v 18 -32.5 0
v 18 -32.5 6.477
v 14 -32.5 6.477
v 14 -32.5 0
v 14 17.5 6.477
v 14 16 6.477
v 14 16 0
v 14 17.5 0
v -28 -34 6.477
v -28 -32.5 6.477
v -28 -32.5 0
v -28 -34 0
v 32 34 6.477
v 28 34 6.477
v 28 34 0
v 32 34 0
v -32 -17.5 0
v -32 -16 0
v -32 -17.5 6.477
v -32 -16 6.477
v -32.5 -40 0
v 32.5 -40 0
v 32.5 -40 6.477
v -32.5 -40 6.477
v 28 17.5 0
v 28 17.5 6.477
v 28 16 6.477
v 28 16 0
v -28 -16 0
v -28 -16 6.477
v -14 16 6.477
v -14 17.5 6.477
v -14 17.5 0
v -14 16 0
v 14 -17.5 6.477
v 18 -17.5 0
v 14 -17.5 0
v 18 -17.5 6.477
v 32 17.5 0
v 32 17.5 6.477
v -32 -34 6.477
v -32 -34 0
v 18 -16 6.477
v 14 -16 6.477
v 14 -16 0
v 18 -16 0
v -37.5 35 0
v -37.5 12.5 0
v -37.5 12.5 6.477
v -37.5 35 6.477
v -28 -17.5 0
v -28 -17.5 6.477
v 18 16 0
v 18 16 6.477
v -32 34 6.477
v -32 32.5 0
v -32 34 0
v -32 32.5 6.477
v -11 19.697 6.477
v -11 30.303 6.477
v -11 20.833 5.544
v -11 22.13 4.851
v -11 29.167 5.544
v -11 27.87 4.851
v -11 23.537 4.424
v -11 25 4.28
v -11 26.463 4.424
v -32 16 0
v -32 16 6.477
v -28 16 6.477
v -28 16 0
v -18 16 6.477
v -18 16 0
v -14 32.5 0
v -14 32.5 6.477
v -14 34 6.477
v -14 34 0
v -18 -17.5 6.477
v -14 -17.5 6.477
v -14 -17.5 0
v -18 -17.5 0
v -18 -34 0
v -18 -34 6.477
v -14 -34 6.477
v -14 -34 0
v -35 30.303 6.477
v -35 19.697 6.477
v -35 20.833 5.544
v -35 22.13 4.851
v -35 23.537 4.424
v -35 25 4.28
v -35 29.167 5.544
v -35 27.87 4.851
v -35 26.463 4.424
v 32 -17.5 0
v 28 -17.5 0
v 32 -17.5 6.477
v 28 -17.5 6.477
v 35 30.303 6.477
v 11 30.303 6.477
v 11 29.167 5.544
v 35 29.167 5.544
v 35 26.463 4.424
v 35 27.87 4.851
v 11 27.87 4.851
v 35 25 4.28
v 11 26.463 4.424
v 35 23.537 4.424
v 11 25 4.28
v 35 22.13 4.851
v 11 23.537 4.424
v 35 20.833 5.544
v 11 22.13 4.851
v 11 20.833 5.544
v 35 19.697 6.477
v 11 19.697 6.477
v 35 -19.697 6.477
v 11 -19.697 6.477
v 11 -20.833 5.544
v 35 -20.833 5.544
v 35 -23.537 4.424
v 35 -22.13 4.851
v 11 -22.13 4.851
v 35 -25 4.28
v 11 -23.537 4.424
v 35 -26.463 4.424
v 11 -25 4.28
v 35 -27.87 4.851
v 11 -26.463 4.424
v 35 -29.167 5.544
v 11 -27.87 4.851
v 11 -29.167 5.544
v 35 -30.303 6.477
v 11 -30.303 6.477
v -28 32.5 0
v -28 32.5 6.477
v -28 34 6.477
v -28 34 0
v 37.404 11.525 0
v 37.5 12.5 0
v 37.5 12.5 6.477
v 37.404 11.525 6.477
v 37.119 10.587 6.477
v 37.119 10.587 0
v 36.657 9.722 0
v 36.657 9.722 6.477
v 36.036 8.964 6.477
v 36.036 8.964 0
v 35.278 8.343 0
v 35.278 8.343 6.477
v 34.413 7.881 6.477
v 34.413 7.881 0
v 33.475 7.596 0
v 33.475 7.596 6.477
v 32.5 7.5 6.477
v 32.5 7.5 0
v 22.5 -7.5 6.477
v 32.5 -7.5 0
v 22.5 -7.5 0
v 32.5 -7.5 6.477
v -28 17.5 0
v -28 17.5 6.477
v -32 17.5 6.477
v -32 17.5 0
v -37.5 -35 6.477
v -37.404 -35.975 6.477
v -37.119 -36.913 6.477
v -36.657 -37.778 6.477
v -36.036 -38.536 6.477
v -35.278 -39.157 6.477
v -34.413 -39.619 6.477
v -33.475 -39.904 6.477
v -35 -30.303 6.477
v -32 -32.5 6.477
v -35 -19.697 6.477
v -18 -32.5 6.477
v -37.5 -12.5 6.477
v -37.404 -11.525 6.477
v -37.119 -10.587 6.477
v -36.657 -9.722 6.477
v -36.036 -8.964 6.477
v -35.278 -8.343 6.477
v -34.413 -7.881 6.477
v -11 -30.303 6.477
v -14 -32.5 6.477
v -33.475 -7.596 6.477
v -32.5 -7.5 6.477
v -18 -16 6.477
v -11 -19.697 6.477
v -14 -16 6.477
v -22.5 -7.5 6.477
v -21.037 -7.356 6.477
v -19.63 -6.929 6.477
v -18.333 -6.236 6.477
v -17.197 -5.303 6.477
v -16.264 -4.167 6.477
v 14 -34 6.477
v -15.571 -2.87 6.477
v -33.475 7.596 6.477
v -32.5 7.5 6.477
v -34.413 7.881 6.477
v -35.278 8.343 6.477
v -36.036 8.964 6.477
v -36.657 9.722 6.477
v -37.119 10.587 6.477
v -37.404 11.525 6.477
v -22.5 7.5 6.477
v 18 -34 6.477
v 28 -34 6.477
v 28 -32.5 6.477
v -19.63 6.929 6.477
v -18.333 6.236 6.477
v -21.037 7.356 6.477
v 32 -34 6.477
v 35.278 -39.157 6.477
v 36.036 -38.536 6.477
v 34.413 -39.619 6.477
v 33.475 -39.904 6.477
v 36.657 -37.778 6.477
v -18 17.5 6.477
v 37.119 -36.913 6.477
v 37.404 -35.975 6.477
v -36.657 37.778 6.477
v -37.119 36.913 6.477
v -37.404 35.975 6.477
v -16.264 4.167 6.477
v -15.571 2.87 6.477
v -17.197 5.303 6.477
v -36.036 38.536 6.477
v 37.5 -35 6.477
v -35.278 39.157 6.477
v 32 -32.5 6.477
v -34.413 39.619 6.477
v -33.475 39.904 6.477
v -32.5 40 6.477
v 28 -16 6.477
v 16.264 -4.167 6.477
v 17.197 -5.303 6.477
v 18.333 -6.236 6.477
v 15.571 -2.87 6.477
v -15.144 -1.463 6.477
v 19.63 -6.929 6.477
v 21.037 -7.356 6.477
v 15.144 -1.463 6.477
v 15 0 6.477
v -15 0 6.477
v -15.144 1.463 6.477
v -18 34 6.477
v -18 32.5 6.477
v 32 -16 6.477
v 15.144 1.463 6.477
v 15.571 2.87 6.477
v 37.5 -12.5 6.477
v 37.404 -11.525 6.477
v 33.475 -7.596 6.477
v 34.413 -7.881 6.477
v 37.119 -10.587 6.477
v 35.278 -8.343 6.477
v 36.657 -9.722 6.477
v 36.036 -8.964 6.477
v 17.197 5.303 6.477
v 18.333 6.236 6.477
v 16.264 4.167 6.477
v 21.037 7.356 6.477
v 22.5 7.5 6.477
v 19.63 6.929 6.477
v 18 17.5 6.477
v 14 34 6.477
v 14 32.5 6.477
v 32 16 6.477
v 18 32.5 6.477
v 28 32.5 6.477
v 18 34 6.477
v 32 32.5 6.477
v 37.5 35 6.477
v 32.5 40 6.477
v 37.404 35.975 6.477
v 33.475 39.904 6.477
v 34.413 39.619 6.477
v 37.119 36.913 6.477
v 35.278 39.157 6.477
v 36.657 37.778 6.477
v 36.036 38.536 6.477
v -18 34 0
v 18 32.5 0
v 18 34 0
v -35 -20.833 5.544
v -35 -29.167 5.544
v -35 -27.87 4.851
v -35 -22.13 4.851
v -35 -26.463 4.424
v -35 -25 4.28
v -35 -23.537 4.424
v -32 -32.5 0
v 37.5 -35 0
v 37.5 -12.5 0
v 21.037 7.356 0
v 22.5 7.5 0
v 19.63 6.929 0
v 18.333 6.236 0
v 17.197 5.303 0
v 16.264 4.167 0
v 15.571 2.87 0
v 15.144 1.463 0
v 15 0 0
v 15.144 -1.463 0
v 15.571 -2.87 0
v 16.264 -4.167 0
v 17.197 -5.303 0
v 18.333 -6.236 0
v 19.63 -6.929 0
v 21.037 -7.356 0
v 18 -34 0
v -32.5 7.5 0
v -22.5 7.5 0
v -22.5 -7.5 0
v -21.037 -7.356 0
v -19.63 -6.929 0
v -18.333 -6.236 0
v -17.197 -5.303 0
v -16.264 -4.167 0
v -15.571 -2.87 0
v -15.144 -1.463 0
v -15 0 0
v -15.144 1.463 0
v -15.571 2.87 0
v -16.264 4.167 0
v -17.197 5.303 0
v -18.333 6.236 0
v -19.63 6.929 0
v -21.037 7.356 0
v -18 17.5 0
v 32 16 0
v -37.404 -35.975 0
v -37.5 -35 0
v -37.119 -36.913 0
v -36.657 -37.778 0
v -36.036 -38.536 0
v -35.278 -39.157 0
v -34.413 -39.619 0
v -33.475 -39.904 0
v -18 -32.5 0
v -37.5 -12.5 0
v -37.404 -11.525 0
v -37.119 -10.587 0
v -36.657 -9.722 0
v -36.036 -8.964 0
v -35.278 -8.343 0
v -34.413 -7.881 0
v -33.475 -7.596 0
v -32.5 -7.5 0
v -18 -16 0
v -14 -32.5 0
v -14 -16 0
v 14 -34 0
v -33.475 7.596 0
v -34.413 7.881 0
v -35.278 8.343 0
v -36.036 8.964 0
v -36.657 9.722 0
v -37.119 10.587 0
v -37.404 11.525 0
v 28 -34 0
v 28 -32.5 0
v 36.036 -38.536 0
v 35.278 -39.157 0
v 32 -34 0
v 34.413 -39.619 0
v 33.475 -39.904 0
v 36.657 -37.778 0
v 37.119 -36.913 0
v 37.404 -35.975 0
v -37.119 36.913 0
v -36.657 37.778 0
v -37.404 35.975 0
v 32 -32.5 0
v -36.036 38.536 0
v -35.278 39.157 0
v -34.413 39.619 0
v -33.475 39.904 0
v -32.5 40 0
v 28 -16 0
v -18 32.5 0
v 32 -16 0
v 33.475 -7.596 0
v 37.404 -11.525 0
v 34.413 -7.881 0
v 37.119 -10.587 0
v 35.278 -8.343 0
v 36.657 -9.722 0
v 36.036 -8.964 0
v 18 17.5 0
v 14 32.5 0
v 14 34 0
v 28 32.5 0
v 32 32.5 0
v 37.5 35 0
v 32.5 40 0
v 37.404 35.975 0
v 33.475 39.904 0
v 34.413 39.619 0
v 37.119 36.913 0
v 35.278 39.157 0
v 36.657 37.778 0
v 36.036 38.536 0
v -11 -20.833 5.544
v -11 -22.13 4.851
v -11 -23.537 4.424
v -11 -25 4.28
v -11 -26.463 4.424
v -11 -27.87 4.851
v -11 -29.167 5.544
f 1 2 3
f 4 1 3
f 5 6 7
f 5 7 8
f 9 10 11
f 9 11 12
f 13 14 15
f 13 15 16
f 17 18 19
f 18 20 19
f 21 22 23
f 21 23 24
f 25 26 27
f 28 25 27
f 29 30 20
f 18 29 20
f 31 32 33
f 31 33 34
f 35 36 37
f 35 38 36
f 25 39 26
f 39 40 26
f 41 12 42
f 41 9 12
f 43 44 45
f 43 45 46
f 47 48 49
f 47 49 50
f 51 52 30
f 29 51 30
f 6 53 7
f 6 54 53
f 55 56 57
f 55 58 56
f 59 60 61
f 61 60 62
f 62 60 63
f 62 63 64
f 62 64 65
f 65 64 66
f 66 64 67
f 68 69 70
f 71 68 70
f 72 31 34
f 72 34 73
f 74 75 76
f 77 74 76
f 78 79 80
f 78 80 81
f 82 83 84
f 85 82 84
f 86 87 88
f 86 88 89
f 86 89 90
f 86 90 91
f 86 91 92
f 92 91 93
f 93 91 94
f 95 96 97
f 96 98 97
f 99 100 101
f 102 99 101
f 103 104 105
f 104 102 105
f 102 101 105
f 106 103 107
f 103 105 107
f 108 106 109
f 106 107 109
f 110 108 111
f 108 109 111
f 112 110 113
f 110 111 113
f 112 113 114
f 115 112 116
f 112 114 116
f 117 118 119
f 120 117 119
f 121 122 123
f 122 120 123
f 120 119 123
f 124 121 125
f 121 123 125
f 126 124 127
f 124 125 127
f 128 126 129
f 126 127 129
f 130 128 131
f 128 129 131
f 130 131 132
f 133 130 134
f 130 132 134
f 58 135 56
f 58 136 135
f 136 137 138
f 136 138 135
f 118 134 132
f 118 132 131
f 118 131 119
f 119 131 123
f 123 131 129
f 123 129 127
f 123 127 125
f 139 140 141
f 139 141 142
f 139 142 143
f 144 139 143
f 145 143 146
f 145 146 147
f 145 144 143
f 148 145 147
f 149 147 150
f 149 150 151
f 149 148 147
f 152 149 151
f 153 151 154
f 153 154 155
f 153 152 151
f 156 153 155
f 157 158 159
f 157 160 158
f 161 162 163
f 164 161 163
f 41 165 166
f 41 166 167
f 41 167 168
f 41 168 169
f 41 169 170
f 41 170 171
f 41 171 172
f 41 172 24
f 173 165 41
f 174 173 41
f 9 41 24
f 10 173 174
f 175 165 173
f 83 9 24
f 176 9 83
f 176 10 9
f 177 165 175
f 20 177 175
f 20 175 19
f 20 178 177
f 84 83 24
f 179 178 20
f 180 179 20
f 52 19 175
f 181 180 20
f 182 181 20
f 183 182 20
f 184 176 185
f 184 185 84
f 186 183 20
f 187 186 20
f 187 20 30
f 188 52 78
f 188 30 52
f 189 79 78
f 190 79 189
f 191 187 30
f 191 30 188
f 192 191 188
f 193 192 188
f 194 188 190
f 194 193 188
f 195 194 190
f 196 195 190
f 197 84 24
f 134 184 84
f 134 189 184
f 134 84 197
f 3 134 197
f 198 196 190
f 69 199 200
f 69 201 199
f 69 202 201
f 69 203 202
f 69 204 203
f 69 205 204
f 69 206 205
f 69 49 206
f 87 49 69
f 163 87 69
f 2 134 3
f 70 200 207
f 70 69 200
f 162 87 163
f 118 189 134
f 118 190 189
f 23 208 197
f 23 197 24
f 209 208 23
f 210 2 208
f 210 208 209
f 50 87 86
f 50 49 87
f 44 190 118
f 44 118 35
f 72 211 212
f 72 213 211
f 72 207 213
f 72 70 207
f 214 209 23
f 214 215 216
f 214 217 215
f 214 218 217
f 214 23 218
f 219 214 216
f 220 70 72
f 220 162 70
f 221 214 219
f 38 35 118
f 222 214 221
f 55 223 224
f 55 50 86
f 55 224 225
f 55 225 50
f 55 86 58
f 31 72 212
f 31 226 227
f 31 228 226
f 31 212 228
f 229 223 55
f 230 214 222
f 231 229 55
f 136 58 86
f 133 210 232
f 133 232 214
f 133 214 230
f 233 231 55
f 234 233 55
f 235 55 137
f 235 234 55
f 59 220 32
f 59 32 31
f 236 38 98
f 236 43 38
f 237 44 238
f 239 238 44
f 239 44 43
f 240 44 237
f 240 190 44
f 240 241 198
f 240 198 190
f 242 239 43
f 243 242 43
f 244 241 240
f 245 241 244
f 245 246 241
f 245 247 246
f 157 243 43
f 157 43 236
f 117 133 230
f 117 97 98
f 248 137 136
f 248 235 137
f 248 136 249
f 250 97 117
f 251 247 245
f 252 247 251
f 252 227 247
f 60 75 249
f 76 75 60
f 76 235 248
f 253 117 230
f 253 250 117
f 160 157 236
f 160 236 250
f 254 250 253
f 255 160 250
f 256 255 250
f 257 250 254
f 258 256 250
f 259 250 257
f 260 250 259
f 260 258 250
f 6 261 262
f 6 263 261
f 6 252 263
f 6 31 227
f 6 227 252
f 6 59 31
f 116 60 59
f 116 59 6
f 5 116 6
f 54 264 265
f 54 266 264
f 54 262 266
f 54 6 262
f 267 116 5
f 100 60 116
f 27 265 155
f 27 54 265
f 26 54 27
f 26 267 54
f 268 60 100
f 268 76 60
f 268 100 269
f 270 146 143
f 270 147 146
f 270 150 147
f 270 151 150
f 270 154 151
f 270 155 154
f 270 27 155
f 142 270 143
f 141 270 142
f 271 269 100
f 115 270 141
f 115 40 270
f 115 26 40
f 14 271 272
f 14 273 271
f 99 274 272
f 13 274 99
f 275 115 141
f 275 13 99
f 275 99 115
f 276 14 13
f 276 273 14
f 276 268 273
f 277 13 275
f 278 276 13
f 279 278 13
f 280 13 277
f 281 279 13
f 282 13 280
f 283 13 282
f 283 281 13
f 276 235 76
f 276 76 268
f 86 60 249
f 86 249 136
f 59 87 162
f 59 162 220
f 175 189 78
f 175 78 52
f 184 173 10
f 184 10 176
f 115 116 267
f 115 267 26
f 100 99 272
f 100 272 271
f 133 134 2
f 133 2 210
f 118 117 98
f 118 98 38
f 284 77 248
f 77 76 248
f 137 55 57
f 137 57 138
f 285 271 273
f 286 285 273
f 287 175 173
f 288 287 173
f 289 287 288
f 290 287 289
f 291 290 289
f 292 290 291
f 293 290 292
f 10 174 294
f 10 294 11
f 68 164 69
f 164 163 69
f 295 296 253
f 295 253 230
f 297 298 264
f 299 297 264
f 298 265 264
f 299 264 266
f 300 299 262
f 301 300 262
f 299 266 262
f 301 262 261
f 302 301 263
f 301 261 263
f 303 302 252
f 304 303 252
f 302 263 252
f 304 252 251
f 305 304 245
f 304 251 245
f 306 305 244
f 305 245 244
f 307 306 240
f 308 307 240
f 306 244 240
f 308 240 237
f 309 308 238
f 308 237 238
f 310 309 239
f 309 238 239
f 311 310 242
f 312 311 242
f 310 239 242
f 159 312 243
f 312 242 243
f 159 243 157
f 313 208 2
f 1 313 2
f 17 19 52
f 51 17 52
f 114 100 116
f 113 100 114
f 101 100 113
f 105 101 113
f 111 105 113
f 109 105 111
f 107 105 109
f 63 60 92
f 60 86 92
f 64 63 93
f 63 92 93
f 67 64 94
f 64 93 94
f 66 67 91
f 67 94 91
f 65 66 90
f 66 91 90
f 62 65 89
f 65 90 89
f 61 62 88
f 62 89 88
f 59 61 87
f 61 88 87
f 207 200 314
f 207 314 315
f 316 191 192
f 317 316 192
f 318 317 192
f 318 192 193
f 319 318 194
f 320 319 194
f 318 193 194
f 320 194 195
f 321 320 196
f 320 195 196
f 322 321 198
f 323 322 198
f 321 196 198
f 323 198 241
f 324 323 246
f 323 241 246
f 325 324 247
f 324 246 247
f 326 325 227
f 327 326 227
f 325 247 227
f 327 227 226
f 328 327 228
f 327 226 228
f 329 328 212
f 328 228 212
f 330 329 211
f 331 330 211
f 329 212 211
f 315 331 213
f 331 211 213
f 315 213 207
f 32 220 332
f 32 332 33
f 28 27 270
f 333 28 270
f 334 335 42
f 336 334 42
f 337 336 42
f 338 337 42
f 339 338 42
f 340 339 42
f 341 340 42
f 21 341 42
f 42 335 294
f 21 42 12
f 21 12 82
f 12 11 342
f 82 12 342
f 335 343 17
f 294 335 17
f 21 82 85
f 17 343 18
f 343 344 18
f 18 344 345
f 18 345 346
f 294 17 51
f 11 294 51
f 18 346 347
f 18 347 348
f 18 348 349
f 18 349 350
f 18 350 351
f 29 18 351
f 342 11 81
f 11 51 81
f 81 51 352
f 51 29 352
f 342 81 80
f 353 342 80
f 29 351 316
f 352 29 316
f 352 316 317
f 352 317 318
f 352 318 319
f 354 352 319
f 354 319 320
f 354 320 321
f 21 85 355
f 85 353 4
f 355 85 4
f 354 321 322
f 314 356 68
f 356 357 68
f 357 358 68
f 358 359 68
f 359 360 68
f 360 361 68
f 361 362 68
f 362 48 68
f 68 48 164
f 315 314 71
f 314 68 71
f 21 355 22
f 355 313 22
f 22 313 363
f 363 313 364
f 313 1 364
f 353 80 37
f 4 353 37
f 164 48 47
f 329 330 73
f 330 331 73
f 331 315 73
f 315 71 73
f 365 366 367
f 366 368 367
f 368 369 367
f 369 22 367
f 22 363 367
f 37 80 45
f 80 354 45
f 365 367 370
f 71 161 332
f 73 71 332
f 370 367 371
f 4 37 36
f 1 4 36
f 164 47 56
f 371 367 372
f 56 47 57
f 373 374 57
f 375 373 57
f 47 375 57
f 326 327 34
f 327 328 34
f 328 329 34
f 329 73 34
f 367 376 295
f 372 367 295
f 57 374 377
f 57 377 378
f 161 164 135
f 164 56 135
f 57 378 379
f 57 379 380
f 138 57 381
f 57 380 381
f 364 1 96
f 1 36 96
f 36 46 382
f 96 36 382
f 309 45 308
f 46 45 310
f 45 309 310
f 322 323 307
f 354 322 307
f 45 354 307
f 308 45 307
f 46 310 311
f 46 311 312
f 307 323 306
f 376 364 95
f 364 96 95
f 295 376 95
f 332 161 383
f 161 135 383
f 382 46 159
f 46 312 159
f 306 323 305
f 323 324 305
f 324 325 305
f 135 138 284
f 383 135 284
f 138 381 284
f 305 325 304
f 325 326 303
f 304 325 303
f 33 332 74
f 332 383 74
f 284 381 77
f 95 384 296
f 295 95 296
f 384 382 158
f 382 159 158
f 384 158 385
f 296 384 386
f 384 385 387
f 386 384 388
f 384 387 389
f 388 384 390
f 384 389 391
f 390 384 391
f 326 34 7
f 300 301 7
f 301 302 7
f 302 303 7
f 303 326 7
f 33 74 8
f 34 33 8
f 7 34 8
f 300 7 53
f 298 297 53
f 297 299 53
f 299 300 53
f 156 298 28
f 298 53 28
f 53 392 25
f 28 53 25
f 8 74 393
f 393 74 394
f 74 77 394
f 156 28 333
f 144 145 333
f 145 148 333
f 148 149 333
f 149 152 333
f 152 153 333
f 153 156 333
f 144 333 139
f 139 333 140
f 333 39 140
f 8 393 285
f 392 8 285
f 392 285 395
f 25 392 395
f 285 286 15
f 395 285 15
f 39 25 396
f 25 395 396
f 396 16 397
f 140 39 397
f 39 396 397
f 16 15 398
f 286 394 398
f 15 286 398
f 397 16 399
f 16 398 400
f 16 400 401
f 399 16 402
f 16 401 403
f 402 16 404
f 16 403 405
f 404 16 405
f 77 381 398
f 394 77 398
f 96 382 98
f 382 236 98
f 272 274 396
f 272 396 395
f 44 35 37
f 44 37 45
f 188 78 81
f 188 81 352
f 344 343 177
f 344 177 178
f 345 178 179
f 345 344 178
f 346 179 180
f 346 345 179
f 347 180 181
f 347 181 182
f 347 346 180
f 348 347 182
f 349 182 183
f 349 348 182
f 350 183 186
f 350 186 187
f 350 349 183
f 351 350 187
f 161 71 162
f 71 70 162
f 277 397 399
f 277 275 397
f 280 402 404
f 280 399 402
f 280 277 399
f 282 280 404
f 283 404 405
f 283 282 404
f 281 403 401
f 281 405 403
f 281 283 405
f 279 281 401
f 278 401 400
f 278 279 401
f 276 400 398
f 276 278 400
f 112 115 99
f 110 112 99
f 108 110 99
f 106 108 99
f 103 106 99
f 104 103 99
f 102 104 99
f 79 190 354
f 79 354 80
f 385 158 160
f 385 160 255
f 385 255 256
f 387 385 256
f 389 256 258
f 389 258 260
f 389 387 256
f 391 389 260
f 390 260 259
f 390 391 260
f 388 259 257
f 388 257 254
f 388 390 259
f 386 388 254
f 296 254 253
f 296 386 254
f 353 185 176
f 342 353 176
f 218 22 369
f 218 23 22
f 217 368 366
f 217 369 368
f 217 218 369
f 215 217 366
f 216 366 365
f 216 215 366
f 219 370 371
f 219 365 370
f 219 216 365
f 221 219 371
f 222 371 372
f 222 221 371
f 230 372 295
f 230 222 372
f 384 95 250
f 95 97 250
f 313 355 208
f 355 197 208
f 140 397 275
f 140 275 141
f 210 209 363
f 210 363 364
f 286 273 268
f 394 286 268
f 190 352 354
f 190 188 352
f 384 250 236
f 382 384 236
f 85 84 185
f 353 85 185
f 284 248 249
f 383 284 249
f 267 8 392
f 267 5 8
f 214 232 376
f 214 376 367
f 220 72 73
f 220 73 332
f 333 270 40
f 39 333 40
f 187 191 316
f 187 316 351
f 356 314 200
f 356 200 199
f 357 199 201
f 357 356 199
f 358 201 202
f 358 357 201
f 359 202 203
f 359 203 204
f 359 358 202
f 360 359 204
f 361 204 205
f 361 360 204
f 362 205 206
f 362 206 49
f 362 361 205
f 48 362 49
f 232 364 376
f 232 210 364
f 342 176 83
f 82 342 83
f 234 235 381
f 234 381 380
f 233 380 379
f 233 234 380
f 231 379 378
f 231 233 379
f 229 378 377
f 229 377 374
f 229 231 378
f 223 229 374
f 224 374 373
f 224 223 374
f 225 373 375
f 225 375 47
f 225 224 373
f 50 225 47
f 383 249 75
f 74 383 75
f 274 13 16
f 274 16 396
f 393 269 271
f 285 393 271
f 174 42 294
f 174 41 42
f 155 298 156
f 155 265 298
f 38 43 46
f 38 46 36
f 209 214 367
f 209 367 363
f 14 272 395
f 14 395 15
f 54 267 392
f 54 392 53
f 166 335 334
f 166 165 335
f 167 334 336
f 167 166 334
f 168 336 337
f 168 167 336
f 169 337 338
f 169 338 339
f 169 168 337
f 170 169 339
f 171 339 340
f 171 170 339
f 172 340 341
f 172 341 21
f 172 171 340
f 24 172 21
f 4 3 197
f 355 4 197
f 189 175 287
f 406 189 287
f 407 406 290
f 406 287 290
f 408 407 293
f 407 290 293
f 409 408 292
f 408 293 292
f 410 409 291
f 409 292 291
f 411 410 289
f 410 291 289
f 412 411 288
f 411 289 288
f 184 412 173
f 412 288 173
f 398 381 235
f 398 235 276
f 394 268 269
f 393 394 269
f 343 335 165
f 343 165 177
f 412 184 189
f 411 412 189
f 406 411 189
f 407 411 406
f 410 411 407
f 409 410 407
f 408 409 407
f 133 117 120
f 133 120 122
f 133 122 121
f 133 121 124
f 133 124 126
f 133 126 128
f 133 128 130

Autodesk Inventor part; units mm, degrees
ref_plane "YZ Plane" through (0, 0, 0) normal (1, 0, 0) x (0, 1, 0)
ref_plane "XZ Plane" through (0, 0, 0) normal (0, 1, 0) x (-1, 0, 0)
ref_plane "XY Plane" through (0, 0, 0) normal (0, 0, 1) x (1, 0, 0)
sketch "Sketch1" plane through (0, 0, 0) normal (0, 0, 1) x (1, 0, 0)
  line L0 (-37.5, 40) -> (37.5, 40)
  line L1 (37.5, 40) -> (37.5, -40)
  line L2 (37.5, -40) -> (-37.5, -40)
  line L3 (-37.5, -40) -> (-37.5, 40)
  point P0 (0, 0)
  point P1 (37.5, 0)
  point P2 (0, 40)
  dimension "d0" = 75
  dimension "d2" = 80
extrude "Extrusion1" add sketch "Sketch1" along normal blind 6.477
sketch "Sketch2" plane through (0, 0, 6.477) normal (0, 0, 1) x (1, 0, 0)
  line L0 (-37.5, 40) -> (-37.5, -40) projected
  line L1 (-11, 19.6967) -> (11, 19.6967) construction
  line L2 (11, 19.6967) -> (11, -19.6967) construction
  line L3 (11, -19.6967) -> (-11, -19.6967) construction
  line L4 (-11, -19.6967) -> (-11, 19.6967) construction
  line L5 (-11, 19.6967) -> (-35, 19.6967)
  line L6 (-35, 19.6967) -> (-35, 30.3033)
  line L7 (-35, 30.3033) -> (-11, 30.3033)
  line L8 (-11, 30.3033) -> (-11, 19.6967)
  line L9 (11, 19.6967) -> (35, 19.6967)
  line L10 (35, 19.6967) -> (35, 30.3033)
  line L11 (35, 30.3033) -> (11, 30.3033)
  line L12 (11, 30.3033) -> (11, 19.6967)
  line L13 (-11, -19.6967) -> (-35, -19.6967)
  line L14 (-35, -19.6967) -> (-35, -30.3033)
  line L15 (-35, -30.3033) -> (-11, -30.3033)
  line L16 (-11, -30.3033) -> (-11, -19.6967)
  line L17 (11, -19.6967) -> (35, -19.6967)
  line L18 (35, -19.6967) -> (35, -30.3033)
  line L19 (35, -30.3033) -> (11, -30.3033)
  line L20 (11, -30.3033) -> (11, -19.6967)
  circle A0 centre (-11, 25) radius 7.5 construction
  line L21 (-11, 25) -> (-5.6967, 19.6967) construction
  point P0 (0, 0)
  point P1 (-11, 0)
  point P2 (0, 19.6967)
  dimension "d11" = 15
  dimension "d5" = 50
  dimension "d7" = 24
  dimension "d9" = 2.5
  dimension "d10" = 45
extrude "Extrusion2" cut sketch "Sketch2" against normal through all
sketch "Sketch3" plane through (-35, 19.6967, 6.477) normal (1, 0, 0) x (0, 0, -1)
  line L0 (6.477, 10.6066) -> (6.477, 0) projected
  line L1 (0, 10.6066) -> (6.477, 10.6066) projected
  line L2 (0, 0) -> (0, 10.6066) projected
  line L3 (0, 0) -> (6.477, 0) projected
  line L4 (6.477, -39.3934) -> (6.477, -50) projected
  line L5 (0, -39.3934) -> (6.477, -39.3934) projected
  line L6 (0, -50) -> (0, -39.3934) projected
  line L7 (0, -50) -> (6.477, -50) projected
  arc A0 (0, 0) -> (0, 10.6066) centre (-5.3033, 5.3033) ccw
  arc A1 (0, -50) -> (0, -39.3934) centre (-5.3033, -44.6967) ccw
  point P0 (6.477, -19.6967)
  dimension "d14" = 15
extrude "Extrusion3" add sketch "Sketch3" along normal up to surface (70 mm away) contours L0 L3 A0 L1 | L4 L7 A1 L5
sketch "Sketch4" plane through (0, 0, 6.477) normal (0, 0, 1) x (1, 0, 0)
  line L0 (-35, 19.6967) -> (-35, 30.3033) projected
  line L1 (-35, 30.3033) -> (-11, 30.3033) projected
  line L2 (-11, 30.3033) -> (-11, 19.6967) projected
  line L3 (-28, 32.5) -> (-18, 32.5) construction
  line L4 (-18, 32.5) -> (-18, 17.5) construction
  line L5 (-18, 17.5) -> (-28, 17.5) construction
  line L6 (-28, 17.5) -> (-28, 32.5) construction
  line L7 (-28, 32.5) -> (-32, 32.5)
  line L8 (-32, 32.5) -> (-32, 34)
  line L9 (-32, 34) -> (-28, 34)
  line L10 (-28, 34) -> (-28, 32.5)
  line L11 (-18, 32.5) -> (-14, 32.5)
  line L12 (-14, 32.5) -> (-14, 34)
  line L13 (-14, 34) -> (-18, 34)
  line L14 (-18, 34) -> (-18, 32.5)
  line L15 (-18, 17.5) -> (-14, 17.5)
  line L16 (-14, 17.5) -> (-14, 16)
  line L17 (-14, 16) -> (-18, 16)
  line L18 (-18, 16) -> (-18, 17.5)
  line L19 (-28, 17.5) -> (-32, 17.5)
  line L20 (-32, 17.5) -> (-32, 16)
  line L21 (-32, 16) -> (-28, 16)
  line L22 (-28, 16) -> (-28, 17.5)
  point P0 (0, 0)
  point P1 (-23, 32.5)
  point P2 (-23, 30.3033)
  point P3 (-18, 25)
  point P4 (-11, 25)
  point P5 (-30, 34)
  dimension "d18" = 5
  dimension "d19" = 15
  dimension "d20" = 4
  dimension "d21" = 1.5
extrude "Extrusion4" cut sketch "Sketch4" against normal through all
mirror "Mirror1" about plane through (0, 0, 0) normal (1, 0, 0) of "Extrusion4"
mirror "Mirror2" about plane through (0, 0, 0) normal (0, 1, 0) of "Extrusion4", "Mirror1"
fillet "Fillet1" radius 5 4 edges at (-37.5, 40, 3.2385) (-37.5, -40, 3.2385) (37.5, -40, 3.2385) (37.5, 40, 3.2385)
sketch "Sketch6" plane through (0, 0, 6.477) normal (0, 0, 1) x (1, 0, 0)
  line L0 (-37.5, 35) -> (-37.5, -35) projected
  line L1 (37.5, -35) -> (37.5, 35) projected
  line L2 (-11, -19.6967) -> (-11, -30.3033) projected
  line L3 (-37.5, 7.5) -> (-22.5, 7.5)
  arc A0 (-22.5, -7.5) -> (-22.5, 7.5) centre (-22.5, 0) ccw
  line L4 (-22.5, -7.5) -> (-37.5, -7.5)
  line L5 (37.5, -7.5) -> (22.5, -7.5)
  arc A1 (22.5, 7.5) -> (22.5, -7.5) centre (22.5, 0) ccw
  line L6 (22.5, 7.5) -> (37.5, 7.5)
  point P0 (0, 0)
  dimension "d31" = 7.5
  dimension "d33" = 15
extrude "Extrusion6" cut sketch "Sketch6" against normal through all
fillet "Fillet3" radius 5 4 edges at (-37.5, -7.5, 3.2385) (-37.5, 7.5, 3.2385) (37.5, 7.5, 3.2385) (37.5, -7.5, 3.2385)
properties part number "EFFECTOR BEARING PLATE"
